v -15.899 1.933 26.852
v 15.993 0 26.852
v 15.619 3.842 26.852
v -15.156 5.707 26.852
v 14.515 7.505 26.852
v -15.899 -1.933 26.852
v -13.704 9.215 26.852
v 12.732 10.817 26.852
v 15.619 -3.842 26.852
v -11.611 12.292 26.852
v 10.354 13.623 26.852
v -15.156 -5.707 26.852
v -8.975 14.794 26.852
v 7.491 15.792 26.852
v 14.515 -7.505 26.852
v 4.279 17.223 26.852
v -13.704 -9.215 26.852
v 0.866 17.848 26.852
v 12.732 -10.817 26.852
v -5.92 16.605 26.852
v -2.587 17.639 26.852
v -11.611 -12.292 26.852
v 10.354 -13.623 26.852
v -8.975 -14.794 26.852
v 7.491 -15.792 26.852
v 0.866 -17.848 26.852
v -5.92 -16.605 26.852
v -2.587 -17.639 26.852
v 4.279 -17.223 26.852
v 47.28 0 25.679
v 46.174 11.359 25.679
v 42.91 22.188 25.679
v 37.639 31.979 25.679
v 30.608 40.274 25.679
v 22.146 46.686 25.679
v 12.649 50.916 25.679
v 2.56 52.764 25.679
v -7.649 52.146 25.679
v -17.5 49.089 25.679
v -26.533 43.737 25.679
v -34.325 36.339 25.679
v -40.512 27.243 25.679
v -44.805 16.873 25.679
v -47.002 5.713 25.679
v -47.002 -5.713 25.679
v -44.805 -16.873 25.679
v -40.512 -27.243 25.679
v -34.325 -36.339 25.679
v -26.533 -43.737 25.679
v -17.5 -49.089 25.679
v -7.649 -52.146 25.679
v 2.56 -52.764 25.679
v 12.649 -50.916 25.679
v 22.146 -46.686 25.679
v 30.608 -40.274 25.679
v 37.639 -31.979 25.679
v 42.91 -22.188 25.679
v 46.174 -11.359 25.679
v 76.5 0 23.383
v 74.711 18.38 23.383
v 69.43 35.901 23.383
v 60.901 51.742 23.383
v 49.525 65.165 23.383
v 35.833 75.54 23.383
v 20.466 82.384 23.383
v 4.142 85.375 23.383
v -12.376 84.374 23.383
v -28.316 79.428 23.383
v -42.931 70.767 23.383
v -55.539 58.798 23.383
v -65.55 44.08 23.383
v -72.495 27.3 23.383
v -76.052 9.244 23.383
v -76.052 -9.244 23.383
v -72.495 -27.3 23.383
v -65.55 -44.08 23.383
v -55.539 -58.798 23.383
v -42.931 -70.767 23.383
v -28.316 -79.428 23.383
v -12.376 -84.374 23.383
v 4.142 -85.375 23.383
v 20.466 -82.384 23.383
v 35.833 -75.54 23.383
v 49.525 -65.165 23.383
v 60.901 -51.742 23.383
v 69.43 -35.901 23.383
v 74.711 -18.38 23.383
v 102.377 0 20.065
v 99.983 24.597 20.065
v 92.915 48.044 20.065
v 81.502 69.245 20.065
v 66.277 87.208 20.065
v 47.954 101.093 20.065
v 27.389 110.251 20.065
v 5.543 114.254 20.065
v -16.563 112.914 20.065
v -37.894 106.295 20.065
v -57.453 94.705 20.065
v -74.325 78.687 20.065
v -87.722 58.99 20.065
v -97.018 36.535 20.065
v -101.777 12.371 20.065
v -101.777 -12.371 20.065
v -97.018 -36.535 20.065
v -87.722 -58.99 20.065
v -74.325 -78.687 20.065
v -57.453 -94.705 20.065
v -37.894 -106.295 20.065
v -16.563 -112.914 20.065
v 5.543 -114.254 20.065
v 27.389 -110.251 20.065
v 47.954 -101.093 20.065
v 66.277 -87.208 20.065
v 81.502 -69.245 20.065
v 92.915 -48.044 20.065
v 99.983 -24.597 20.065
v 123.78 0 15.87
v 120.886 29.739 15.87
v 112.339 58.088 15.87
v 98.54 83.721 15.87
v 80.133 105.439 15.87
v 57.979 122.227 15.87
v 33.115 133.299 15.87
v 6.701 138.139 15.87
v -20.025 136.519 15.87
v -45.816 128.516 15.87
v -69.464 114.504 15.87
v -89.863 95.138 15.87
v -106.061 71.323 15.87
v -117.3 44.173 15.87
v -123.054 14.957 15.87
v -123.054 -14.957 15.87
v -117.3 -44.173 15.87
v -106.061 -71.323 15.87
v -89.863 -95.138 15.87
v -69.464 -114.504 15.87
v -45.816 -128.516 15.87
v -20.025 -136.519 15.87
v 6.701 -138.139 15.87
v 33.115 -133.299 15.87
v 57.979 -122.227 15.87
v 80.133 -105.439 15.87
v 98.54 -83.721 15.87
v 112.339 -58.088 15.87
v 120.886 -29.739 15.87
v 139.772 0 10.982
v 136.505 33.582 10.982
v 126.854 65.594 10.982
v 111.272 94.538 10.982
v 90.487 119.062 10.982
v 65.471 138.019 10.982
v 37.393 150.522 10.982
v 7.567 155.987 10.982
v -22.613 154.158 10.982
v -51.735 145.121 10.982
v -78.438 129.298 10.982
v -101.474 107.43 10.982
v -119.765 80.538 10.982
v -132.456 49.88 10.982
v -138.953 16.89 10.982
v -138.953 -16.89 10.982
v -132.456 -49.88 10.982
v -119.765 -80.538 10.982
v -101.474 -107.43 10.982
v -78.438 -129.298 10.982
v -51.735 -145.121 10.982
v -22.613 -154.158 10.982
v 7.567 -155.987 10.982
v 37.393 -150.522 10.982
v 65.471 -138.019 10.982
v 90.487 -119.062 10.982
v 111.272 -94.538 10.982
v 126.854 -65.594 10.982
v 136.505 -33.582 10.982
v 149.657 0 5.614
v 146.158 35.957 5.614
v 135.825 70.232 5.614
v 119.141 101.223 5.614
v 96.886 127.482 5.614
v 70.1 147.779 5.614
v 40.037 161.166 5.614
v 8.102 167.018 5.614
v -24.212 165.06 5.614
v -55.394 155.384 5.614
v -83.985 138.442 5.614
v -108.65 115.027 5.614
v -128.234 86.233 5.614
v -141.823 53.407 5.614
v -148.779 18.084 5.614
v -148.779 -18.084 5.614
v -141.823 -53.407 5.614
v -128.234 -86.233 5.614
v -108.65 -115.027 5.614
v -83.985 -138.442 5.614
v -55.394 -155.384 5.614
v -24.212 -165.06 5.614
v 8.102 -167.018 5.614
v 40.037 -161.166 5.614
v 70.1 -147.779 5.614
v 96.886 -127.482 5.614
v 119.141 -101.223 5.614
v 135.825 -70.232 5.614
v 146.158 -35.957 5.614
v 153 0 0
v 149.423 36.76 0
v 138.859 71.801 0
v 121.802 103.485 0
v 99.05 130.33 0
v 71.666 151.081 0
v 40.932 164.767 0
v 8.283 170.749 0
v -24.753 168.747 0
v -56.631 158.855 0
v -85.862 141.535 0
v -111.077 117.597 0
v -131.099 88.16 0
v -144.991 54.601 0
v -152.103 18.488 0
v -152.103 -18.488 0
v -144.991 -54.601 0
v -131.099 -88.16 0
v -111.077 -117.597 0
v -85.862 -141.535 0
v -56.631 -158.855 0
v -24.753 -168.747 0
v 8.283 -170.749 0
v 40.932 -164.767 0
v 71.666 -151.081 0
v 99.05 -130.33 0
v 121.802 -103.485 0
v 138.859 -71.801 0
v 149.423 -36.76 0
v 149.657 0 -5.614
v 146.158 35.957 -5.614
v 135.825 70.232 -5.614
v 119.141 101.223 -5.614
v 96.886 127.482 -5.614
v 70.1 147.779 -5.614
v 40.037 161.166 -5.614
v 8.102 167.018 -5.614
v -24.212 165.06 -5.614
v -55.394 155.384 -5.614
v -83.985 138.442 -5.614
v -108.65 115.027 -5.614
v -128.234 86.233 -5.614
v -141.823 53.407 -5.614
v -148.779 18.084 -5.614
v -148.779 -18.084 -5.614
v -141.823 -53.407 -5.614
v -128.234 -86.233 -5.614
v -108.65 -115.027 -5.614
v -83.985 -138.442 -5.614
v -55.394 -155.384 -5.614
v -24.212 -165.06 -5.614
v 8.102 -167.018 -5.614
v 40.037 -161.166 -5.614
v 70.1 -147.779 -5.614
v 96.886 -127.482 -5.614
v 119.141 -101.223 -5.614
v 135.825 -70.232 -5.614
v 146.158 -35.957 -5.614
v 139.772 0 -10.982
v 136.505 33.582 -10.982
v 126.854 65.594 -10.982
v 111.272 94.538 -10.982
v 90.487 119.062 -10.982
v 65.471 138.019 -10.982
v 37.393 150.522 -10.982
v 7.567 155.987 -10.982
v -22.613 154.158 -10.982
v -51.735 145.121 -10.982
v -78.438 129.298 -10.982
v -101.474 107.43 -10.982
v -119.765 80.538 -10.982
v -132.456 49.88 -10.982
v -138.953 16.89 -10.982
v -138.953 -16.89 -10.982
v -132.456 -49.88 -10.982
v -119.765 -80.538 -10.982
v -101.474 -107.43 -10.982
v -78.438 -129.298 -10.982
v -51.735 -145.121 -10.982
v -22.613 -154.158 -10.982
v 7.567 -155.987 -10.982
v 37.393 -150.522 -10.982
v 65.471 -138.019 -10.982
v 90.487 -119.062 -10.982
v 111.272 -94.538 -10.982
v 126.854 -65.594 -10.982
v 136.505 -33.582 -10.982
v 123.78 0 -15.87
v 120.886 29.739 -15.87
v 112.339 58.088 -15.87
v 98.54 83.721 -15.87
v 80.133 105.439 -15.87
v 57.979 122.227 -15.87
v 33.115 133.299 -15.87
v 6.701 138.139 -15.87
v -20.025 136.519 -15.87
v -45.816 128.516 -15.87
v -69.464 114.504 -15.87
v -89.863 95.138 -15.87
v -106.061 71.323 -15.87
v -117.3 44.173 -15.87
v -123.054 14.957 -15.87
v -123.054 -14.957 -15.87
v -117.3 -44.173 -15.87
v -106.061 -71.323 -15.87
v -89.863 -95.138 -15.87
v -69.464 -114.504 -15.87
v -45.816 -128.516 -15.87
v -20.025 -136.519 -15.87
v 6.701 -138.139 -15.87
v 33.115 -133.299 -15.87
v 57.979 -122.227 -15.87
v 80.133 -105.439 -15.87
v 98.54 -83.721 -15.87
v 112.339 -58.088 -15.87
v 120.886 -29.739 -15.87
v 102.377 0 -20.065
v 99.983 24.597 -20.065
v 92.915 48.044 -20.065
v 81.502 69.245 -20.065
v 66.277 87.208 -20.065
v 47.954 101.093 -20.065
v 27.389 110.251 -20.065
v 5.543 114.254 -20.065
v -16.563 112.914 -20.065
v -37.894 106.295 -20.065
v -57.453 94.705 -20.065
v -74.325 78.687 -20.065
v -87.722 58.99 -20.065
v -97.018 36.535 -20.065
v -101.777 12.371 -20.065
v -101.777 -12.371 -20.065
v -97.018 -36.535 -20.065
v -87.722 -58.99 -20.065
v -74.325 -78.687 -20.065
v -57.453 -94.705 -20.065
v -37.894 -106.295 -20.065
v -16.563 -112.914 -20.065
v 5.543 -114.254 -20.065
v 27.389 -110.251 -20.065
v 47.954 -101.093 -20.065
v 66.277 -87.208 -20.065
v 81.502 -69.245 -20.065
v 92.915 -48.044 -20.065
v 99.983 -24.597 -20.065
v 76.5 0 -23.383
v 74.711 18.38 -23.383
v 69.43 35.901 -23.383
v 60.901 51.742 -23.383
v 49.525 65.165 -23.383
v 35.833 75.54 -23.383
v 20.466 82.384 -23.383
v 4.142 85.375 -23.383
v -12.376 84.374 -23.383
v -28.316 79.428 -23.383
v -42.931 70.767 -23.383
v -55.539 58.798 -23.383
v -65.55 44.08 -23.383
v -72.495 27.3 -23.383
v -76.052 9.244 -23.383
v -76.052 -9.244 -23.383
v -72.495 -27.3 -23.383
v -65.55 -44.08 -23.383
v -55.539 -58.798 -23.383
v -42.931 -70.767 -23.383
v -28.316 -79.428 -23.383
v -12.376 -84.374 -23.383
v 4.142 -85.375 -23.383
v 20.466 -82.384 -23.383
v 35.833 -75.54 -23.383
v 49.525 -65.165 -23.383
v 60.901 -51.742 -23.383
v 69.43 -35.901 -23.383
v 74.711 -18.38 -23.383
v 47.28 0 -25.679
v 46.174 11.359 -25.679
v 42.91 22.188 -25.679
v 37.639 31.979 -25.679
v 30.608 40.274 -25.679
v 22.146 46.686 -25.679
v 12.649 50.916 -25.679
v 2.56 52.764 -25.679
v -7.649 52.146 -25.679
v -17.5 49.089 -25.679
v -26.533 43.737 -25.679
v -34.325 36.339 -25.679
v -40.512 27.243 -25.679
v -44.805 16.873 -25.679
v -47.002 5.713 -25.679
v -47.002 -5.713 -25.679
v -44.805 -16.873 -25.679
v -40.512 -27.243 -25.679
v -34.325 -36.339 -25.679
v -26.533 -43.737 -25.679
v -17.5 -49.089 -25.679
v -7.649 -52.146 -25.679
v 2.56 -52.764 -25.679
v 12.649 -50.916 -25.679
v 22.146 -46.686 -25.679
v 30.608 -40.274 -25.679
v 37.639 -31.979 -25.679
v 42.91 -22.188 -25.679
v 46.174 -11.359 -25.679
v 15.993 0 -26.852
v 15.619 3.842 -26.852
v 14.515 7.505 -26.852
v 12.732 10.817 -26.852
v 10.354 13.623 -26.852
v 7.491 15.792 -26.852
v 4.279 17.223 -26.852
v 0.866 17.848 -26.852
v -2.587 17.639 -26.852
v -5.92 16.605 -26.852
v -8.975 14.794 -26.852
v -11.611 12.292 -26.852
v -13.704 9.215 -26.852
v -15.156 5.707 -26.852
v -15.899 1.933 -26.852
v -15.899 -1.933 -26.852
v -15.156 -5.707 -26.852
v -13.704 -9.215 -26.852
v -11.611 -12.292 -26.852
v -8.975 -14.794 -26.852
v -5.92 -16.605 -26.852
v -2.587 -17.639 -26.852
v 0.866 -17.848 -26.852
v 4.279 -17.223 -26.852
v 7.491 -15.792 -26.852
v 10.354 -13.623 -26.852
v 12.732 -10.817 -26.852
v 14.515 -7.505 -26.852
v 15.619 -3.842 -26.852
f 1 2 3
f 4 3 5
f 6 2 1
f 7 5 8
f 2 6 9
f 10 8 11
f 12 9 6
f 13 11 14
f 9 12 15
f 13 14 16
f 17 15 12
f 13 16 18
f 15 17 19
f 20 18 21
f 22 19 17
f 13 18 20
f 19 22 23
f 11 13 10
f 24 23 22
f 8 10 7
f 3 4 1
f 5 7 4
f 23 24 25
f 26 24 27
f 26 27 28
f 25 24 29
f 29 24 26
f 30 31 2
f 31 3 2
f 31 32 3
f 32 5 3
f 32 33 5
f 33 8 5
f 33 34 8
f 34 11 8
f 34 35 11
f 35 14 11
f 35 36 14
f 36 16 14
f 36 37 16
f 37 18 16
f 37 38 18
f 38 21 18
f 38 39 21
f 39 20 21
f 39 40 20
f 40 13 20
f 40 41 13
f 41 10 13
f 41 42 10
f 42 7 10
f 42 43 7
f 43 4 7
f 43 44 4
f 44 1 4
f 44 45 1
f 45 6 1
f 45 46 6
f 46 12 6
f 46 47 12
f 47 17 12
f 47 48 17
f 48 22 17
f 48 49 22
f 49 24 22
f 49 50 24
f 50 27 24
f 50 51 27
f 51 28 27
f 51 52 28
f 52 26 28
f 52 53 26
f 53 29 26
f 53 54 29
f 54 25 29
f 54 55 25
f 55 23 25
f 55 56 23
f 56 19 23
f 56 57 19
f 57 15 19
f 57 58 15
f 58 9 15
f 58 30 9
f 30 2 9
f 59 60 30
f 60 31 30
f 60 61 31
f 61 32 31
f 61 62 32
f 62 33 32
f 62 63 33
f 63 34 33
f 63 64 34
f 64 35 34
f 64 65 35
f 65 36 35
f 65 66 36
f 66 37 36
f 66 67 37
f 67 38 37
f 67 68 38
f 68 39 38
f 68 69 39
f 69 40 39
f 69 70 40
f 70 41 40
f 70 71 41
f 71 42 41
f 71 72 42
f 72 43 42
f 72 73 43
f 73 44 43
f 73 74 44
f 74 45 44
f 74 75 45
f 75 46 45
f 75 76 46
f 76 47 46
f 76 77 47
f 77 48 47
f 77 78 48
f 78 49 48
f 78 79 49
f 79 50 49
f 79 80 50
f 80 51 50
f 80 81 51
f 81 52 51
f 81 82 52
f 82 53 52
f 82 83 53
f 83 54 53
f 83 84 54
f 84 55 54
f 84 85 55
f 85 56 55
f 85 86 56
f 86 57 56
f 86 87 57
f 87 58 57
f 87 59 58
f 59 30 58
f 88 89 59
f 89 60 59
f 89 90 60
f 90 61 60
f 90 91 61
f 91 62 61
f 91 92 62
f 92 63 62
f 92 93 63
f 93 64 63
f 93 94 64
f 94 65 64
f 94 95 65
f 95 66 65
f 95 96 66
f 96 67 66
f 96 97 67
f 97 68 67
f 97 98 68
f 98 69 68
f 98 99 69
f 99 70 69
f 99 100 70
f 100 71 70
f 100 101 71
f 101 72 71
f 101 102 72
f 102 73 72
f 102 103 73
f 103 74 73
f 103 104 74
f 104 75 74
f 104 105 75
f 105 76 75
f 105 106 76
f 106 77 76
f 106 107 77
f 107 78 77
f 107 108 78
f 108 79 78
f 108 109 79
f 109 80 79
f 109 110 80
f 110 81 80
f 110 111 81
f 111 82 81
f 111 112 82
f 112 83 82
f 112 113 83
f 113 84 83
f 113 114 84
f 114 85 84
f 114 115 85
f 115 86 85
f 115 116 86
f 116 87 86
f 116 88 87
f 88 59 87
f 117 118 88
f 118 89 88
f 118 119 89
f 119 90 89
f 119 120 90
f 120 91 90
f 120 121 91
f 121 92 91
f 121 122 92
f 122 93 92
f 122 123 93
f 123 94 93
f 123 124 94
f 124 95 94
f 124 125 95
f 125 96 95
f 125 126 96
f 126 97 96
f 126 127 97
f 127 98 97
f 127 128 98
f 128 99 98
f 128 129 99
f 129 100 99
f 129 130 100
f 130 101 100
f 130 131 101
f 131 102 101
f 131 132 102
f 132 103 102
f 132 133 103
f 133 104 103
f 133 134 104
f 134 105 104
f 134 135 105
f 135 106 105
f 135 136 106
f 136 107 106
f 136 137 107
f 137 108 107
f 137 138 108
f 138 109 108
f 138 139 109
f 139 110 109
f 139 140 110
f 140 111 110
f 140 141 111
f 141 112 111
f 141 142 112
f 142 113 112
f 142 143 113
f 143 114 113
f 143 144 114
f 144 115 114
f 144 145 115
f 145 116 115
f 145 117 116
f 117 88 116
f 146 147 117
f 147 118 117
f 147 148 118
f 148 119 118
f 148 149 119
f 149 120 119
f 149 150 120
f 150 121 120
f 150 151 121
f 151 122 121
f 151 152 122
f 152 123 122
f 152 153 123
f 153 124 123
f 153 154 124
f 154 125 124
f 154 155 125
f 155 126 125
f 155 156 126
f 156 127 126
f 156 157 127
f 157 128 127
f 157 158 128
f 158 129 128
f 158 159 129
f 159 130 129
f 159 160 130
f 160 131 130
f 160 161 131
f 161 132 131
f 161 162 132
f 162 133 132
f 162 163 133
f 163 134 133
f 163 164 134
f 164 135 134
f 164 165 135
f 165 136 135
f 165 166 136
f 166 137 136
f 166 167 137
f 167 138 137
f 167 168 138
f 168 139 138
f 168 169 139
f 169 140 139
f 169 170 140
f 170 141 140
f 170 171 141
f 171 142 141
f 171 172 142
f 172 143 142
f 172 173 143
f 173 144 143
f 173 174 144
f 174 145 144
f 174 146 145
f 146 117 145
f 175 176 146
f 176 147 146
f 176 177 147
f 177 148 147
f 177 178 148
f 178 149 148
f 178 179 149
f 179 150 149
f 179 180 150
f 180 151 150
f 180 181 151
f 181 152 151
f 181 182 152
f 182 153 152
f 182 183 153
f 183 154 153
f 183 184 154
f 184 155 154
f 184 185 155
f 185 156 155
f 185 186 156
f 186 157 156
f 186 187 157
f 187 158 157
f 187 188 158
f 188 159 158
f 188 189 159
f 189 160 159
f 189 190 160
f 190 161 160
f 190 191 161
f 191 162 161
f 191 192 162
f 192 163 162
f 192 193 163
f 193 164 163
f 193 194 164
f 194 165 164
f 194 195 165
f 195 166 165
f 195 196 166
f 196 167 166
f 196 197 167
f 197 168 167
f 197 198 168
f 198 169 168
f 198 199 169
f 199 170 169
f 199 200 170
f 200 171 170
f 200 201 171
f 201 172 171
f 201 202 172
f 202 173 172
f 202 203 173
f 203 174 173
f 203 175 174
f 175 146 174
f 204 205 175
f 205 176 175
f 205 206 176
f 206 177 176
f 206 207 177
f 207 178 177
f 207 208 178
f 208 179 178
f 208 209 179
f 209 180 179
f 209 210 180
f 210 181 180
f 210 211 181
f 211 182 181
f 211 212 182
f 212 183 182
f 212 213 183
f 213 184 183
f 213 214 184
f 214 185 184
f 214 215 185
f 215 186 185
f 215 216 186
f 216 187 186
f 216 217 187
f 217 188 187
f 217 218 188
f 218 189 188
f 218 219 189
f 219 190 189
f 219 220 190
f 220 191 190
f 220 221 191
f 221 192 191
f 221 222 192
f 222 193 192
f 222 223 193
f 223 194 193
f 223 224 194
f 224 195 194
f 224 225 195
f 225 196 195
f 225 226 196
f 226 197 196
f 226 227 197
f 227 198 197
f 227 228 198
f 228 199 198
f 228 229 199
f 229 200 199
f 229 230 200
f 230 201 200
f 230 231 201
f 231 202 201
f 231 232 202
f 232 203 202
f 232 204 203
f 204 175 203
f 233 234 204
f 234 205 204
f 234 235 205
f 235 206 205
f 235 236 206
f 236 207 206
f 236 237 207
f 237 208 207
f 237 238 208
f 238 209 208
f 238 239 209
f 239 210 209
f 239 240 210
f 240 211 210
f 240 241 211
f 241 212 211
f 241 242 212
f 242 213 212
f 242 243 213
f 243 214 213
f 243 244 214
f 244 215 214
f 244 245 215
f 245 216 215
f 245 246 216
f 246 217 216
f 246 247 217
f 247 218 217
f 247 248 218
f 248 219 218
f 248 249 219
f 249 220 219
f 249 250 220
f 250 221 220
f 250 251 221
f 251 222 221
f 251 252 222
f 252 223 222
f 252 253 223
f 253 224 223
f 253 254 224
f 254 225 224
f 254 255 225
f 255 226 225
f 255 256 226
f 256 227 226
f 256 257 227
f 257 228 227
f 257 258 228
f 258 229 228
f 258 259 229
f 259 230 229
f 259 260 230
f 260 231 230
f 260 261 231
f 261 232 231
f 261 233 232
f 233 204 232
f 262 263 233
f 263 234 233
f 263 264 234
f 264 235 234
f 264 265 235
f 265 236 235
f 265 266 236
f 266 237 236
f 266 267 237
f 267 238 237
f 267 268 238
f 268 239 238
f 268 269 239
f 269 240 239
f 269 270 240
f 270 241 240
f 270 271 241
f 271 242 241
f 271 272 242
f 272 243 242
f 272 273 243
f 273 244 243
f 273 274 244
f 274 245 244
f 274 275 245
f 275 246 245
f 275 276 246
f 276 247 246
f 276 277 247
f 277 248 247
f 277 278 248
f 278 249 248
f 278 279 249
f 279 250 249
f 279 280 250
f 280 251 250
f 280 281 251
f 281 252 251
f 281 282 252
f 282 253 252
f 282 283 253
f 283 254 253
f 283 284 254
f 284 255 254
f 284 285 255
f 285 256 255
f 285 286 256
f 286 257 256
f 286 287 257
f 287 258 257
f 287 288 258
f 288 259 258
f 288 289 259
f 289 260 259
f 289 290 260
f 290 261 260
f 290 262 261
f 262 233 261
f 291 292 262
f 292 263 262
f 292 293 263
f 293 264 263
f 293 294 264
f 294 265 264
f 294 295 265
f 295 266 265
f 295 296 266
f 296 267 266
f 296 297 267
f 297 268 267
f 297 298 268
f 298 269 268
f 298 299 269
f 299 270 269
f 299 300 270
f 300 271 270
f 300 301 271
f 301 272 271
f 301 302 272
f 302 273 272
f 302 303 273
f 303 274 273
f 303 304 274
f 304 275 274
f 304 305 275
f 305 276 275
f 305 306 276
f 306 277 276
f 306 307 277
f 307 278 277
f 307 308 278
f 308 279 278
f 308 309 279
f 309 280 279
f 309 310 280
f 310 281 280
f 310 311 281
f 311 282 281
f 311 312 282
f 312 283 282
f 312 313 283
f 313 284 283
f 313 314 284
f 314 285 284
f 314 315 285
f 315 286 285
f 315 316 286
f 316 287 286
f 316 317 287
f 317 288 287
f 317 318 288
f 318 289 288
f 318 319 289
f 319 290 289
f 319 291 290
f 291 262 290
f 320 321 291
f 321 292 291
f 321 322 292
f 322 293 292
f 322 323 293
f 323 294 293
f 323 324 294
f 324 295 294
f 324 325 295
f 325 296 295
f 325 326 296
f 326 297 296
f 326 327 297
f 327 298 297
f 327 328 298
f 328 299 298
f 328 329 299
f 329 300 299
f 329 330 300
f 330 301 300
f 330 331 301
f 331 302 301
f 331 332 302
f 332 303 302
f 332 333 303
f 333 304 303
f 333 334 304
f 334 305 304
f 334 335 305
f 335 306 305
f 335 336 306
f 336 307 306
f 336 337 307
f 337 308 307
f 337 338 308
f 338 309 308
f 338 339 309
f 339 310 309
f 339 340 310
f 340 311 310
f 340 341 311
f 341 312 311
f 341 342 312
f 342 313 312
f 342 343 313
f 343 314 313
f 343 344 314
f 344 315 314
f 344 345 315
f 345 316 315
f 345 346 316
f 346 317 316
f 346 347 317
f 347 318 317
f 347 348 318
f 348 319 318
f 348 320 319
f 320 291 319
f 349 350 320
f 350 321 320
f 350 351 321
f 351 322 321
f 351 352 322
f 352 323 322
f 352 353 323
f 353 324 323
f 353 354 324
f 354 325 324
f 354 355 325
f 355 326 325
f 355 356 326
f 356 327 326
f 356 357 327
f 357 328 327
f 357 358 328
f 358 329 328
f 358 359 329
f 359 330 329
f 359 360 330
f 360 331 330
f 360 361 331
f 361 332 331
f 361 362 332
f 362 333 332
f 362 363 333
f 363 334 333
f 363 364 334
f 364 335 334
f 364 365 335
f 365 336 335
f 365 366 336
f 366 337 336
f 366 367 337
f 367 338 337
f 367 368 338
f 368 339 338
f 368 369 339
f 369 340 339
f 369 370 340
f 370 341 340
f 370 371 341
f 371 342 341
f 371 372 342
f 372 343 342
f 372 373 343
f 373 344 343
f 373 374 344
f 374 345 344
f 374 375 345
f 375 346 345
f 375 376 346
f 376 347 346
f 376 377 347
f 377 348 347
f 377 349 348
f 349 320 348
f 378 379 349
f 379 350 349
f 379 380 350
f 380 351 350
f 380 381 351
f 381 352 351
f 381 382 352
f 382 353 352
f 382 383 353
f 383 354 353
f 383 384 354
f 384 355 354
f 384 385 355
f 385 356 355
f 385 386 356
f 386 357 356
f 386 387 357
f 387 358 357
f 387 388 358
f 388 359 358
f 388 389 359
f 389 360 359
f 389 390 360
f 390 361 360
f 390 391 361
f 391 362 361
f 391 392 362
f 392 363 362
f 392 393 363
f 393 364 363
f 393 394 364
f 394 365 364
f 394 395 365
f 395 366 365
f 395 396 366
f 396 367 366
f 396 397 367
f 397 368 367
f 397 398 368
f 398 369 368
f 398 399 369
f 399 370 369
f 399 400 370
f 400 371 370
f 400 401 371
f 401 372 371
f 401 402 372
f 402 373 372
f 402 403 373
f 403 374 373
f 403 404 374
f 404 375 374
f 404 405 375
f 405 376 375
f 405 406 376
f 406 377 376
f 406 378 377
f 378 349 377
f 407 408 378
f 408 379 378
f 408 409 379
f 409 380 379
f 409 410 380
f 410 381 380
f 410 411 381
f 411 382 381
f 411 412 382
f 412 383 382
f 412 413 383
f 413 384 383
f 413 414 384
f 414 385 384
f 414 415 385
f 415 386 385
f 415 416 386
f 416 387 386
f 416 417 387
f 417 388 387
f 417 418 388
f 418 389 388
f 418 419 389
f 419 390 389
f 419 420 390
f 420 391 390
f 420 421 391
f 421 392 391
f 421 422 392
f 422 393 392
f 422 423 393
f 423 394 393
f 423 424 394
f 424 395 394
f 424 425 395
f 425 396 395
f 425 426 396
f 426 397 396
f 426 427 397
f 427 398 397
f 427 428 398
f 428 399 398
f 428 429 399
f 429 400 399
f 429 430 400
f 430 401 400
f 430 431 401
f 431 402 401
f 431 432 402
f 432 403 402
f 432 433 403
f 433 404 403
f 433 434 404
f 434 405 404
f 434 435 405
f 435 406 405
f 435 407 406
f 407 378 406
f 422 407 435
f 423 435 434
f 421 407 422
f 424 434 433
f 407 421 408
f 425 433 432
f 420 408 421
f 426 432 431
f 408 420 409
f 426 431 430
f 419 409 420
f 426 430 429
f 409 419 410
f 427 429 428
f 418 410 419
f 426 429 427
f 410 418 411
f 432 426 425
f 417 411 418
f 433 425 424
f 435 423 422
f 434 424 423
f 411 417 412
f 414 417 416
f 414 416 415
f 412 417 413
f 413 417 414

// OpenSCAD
// Generated by SolidPython 1.0.1 on 2020-07-29 00:46:53


scale(v = [17, 19, 3]) {
	sphere(r = 9);
}
/***********************************************
*********      SolidPython code:      **********
************************************************
 
# import packages: SolidPython
from solid import *
from solid.utils import *
from itertools import chain, combinations, permutations


class Resize:

    def __init__(self, scad_file):
        self.scad_file = scad_file
        #self.scad_file = import_scad(scad_file)
        # cone/cylinder param:
        self.r1 = 0
        self.r2 = 0
        self.h = 0
        # rectangular prism param:
        self.w = 0
        self.l = 0
        # ellipse param:
        self.r = 0

    # import OpenScad code (file name corresponds to shape)


    # classify shape + parameters
    def assign(self, param1, param2, param3):
        if self.scad_file == 'cone.scad':
            self.r1 = param1
            self.r2 = param2
            self.h = param3
        elif self.scad_file == 'cylinder.scad':
            self.r1 = param1
            self.r2 = param2
            self.h = param3
        elif self.scad_file == 'rectangularPrism.scad':
            self.h = param1
            self.l = param2
            self.w = param3
        else:
            self.r = param1
            self.h = param2

    # resize parameters
    def iterate(self):
        x = range(3, 20, 2)
        i = 1
        if self.scad_file == 'cone.scad':
            tempList = list(permutations(x, 2))
            for temp in tempList:
                param1 = temp[0]
                param2 = temp[1]
                filepath = 'produced_scad_files/' + 'cone' + str(param1) + '_' + str(param2) + '_' + '.scad'
                scad_render_to_file(cylinder(h=param1, r1=param2, r2=0), filepath)

        elif self.scad_file == 'cylinder.scad':
            tempList = list(permutations(x, 3))
            for temp in tempList:
                param1 = temp[0]
                param2 = temp[1]
                filepath = 'produced_scad_files/' + 'cylinder' + str(param1) + '_' + str(param2) + '_' + '.scad'
                scad_render_to_file(cylinder(h=param1, r1=param2, r2=param2), filepath)

        elif self.scad_file == 'rectangularPrism.scad':
            tempList = list(permutations(x, 3))
            for temp in tempList:
                param1 = temp[0]
                param2 = temp[1]
                param3 = temp[2]
                filepath = 'produced_scad_files/' + 'rectangularPrism' + str(param1) + '_' + str(param2) + '_' + str(
                    param3) + '.scad'
                scad_render_to_file(cube(size=(param1, param2, param3)), filepath)

        elif self.scad_file == 'ellipse.scad':
            tempList = list(permutations(x, 4))
            for temp in tempList:
                param1 = temp[0]
                param2 = temp[1]
                param3 = temp[2]
                param4 = temp[3]
                filepath = 'produced_scad_files/' + 'ellipse' + str(param1) + '_' + str(param2) + '_' + str(param3) + '_' + str(param4) + '.scad'
                scad_render_to_file(scale([param1, param2, param3])(sphere(r=param4)), filepath)

    def render_to_scadfile(self):
        scad_render_to_file(scad, 'example.scad') 
 
************************************************/
